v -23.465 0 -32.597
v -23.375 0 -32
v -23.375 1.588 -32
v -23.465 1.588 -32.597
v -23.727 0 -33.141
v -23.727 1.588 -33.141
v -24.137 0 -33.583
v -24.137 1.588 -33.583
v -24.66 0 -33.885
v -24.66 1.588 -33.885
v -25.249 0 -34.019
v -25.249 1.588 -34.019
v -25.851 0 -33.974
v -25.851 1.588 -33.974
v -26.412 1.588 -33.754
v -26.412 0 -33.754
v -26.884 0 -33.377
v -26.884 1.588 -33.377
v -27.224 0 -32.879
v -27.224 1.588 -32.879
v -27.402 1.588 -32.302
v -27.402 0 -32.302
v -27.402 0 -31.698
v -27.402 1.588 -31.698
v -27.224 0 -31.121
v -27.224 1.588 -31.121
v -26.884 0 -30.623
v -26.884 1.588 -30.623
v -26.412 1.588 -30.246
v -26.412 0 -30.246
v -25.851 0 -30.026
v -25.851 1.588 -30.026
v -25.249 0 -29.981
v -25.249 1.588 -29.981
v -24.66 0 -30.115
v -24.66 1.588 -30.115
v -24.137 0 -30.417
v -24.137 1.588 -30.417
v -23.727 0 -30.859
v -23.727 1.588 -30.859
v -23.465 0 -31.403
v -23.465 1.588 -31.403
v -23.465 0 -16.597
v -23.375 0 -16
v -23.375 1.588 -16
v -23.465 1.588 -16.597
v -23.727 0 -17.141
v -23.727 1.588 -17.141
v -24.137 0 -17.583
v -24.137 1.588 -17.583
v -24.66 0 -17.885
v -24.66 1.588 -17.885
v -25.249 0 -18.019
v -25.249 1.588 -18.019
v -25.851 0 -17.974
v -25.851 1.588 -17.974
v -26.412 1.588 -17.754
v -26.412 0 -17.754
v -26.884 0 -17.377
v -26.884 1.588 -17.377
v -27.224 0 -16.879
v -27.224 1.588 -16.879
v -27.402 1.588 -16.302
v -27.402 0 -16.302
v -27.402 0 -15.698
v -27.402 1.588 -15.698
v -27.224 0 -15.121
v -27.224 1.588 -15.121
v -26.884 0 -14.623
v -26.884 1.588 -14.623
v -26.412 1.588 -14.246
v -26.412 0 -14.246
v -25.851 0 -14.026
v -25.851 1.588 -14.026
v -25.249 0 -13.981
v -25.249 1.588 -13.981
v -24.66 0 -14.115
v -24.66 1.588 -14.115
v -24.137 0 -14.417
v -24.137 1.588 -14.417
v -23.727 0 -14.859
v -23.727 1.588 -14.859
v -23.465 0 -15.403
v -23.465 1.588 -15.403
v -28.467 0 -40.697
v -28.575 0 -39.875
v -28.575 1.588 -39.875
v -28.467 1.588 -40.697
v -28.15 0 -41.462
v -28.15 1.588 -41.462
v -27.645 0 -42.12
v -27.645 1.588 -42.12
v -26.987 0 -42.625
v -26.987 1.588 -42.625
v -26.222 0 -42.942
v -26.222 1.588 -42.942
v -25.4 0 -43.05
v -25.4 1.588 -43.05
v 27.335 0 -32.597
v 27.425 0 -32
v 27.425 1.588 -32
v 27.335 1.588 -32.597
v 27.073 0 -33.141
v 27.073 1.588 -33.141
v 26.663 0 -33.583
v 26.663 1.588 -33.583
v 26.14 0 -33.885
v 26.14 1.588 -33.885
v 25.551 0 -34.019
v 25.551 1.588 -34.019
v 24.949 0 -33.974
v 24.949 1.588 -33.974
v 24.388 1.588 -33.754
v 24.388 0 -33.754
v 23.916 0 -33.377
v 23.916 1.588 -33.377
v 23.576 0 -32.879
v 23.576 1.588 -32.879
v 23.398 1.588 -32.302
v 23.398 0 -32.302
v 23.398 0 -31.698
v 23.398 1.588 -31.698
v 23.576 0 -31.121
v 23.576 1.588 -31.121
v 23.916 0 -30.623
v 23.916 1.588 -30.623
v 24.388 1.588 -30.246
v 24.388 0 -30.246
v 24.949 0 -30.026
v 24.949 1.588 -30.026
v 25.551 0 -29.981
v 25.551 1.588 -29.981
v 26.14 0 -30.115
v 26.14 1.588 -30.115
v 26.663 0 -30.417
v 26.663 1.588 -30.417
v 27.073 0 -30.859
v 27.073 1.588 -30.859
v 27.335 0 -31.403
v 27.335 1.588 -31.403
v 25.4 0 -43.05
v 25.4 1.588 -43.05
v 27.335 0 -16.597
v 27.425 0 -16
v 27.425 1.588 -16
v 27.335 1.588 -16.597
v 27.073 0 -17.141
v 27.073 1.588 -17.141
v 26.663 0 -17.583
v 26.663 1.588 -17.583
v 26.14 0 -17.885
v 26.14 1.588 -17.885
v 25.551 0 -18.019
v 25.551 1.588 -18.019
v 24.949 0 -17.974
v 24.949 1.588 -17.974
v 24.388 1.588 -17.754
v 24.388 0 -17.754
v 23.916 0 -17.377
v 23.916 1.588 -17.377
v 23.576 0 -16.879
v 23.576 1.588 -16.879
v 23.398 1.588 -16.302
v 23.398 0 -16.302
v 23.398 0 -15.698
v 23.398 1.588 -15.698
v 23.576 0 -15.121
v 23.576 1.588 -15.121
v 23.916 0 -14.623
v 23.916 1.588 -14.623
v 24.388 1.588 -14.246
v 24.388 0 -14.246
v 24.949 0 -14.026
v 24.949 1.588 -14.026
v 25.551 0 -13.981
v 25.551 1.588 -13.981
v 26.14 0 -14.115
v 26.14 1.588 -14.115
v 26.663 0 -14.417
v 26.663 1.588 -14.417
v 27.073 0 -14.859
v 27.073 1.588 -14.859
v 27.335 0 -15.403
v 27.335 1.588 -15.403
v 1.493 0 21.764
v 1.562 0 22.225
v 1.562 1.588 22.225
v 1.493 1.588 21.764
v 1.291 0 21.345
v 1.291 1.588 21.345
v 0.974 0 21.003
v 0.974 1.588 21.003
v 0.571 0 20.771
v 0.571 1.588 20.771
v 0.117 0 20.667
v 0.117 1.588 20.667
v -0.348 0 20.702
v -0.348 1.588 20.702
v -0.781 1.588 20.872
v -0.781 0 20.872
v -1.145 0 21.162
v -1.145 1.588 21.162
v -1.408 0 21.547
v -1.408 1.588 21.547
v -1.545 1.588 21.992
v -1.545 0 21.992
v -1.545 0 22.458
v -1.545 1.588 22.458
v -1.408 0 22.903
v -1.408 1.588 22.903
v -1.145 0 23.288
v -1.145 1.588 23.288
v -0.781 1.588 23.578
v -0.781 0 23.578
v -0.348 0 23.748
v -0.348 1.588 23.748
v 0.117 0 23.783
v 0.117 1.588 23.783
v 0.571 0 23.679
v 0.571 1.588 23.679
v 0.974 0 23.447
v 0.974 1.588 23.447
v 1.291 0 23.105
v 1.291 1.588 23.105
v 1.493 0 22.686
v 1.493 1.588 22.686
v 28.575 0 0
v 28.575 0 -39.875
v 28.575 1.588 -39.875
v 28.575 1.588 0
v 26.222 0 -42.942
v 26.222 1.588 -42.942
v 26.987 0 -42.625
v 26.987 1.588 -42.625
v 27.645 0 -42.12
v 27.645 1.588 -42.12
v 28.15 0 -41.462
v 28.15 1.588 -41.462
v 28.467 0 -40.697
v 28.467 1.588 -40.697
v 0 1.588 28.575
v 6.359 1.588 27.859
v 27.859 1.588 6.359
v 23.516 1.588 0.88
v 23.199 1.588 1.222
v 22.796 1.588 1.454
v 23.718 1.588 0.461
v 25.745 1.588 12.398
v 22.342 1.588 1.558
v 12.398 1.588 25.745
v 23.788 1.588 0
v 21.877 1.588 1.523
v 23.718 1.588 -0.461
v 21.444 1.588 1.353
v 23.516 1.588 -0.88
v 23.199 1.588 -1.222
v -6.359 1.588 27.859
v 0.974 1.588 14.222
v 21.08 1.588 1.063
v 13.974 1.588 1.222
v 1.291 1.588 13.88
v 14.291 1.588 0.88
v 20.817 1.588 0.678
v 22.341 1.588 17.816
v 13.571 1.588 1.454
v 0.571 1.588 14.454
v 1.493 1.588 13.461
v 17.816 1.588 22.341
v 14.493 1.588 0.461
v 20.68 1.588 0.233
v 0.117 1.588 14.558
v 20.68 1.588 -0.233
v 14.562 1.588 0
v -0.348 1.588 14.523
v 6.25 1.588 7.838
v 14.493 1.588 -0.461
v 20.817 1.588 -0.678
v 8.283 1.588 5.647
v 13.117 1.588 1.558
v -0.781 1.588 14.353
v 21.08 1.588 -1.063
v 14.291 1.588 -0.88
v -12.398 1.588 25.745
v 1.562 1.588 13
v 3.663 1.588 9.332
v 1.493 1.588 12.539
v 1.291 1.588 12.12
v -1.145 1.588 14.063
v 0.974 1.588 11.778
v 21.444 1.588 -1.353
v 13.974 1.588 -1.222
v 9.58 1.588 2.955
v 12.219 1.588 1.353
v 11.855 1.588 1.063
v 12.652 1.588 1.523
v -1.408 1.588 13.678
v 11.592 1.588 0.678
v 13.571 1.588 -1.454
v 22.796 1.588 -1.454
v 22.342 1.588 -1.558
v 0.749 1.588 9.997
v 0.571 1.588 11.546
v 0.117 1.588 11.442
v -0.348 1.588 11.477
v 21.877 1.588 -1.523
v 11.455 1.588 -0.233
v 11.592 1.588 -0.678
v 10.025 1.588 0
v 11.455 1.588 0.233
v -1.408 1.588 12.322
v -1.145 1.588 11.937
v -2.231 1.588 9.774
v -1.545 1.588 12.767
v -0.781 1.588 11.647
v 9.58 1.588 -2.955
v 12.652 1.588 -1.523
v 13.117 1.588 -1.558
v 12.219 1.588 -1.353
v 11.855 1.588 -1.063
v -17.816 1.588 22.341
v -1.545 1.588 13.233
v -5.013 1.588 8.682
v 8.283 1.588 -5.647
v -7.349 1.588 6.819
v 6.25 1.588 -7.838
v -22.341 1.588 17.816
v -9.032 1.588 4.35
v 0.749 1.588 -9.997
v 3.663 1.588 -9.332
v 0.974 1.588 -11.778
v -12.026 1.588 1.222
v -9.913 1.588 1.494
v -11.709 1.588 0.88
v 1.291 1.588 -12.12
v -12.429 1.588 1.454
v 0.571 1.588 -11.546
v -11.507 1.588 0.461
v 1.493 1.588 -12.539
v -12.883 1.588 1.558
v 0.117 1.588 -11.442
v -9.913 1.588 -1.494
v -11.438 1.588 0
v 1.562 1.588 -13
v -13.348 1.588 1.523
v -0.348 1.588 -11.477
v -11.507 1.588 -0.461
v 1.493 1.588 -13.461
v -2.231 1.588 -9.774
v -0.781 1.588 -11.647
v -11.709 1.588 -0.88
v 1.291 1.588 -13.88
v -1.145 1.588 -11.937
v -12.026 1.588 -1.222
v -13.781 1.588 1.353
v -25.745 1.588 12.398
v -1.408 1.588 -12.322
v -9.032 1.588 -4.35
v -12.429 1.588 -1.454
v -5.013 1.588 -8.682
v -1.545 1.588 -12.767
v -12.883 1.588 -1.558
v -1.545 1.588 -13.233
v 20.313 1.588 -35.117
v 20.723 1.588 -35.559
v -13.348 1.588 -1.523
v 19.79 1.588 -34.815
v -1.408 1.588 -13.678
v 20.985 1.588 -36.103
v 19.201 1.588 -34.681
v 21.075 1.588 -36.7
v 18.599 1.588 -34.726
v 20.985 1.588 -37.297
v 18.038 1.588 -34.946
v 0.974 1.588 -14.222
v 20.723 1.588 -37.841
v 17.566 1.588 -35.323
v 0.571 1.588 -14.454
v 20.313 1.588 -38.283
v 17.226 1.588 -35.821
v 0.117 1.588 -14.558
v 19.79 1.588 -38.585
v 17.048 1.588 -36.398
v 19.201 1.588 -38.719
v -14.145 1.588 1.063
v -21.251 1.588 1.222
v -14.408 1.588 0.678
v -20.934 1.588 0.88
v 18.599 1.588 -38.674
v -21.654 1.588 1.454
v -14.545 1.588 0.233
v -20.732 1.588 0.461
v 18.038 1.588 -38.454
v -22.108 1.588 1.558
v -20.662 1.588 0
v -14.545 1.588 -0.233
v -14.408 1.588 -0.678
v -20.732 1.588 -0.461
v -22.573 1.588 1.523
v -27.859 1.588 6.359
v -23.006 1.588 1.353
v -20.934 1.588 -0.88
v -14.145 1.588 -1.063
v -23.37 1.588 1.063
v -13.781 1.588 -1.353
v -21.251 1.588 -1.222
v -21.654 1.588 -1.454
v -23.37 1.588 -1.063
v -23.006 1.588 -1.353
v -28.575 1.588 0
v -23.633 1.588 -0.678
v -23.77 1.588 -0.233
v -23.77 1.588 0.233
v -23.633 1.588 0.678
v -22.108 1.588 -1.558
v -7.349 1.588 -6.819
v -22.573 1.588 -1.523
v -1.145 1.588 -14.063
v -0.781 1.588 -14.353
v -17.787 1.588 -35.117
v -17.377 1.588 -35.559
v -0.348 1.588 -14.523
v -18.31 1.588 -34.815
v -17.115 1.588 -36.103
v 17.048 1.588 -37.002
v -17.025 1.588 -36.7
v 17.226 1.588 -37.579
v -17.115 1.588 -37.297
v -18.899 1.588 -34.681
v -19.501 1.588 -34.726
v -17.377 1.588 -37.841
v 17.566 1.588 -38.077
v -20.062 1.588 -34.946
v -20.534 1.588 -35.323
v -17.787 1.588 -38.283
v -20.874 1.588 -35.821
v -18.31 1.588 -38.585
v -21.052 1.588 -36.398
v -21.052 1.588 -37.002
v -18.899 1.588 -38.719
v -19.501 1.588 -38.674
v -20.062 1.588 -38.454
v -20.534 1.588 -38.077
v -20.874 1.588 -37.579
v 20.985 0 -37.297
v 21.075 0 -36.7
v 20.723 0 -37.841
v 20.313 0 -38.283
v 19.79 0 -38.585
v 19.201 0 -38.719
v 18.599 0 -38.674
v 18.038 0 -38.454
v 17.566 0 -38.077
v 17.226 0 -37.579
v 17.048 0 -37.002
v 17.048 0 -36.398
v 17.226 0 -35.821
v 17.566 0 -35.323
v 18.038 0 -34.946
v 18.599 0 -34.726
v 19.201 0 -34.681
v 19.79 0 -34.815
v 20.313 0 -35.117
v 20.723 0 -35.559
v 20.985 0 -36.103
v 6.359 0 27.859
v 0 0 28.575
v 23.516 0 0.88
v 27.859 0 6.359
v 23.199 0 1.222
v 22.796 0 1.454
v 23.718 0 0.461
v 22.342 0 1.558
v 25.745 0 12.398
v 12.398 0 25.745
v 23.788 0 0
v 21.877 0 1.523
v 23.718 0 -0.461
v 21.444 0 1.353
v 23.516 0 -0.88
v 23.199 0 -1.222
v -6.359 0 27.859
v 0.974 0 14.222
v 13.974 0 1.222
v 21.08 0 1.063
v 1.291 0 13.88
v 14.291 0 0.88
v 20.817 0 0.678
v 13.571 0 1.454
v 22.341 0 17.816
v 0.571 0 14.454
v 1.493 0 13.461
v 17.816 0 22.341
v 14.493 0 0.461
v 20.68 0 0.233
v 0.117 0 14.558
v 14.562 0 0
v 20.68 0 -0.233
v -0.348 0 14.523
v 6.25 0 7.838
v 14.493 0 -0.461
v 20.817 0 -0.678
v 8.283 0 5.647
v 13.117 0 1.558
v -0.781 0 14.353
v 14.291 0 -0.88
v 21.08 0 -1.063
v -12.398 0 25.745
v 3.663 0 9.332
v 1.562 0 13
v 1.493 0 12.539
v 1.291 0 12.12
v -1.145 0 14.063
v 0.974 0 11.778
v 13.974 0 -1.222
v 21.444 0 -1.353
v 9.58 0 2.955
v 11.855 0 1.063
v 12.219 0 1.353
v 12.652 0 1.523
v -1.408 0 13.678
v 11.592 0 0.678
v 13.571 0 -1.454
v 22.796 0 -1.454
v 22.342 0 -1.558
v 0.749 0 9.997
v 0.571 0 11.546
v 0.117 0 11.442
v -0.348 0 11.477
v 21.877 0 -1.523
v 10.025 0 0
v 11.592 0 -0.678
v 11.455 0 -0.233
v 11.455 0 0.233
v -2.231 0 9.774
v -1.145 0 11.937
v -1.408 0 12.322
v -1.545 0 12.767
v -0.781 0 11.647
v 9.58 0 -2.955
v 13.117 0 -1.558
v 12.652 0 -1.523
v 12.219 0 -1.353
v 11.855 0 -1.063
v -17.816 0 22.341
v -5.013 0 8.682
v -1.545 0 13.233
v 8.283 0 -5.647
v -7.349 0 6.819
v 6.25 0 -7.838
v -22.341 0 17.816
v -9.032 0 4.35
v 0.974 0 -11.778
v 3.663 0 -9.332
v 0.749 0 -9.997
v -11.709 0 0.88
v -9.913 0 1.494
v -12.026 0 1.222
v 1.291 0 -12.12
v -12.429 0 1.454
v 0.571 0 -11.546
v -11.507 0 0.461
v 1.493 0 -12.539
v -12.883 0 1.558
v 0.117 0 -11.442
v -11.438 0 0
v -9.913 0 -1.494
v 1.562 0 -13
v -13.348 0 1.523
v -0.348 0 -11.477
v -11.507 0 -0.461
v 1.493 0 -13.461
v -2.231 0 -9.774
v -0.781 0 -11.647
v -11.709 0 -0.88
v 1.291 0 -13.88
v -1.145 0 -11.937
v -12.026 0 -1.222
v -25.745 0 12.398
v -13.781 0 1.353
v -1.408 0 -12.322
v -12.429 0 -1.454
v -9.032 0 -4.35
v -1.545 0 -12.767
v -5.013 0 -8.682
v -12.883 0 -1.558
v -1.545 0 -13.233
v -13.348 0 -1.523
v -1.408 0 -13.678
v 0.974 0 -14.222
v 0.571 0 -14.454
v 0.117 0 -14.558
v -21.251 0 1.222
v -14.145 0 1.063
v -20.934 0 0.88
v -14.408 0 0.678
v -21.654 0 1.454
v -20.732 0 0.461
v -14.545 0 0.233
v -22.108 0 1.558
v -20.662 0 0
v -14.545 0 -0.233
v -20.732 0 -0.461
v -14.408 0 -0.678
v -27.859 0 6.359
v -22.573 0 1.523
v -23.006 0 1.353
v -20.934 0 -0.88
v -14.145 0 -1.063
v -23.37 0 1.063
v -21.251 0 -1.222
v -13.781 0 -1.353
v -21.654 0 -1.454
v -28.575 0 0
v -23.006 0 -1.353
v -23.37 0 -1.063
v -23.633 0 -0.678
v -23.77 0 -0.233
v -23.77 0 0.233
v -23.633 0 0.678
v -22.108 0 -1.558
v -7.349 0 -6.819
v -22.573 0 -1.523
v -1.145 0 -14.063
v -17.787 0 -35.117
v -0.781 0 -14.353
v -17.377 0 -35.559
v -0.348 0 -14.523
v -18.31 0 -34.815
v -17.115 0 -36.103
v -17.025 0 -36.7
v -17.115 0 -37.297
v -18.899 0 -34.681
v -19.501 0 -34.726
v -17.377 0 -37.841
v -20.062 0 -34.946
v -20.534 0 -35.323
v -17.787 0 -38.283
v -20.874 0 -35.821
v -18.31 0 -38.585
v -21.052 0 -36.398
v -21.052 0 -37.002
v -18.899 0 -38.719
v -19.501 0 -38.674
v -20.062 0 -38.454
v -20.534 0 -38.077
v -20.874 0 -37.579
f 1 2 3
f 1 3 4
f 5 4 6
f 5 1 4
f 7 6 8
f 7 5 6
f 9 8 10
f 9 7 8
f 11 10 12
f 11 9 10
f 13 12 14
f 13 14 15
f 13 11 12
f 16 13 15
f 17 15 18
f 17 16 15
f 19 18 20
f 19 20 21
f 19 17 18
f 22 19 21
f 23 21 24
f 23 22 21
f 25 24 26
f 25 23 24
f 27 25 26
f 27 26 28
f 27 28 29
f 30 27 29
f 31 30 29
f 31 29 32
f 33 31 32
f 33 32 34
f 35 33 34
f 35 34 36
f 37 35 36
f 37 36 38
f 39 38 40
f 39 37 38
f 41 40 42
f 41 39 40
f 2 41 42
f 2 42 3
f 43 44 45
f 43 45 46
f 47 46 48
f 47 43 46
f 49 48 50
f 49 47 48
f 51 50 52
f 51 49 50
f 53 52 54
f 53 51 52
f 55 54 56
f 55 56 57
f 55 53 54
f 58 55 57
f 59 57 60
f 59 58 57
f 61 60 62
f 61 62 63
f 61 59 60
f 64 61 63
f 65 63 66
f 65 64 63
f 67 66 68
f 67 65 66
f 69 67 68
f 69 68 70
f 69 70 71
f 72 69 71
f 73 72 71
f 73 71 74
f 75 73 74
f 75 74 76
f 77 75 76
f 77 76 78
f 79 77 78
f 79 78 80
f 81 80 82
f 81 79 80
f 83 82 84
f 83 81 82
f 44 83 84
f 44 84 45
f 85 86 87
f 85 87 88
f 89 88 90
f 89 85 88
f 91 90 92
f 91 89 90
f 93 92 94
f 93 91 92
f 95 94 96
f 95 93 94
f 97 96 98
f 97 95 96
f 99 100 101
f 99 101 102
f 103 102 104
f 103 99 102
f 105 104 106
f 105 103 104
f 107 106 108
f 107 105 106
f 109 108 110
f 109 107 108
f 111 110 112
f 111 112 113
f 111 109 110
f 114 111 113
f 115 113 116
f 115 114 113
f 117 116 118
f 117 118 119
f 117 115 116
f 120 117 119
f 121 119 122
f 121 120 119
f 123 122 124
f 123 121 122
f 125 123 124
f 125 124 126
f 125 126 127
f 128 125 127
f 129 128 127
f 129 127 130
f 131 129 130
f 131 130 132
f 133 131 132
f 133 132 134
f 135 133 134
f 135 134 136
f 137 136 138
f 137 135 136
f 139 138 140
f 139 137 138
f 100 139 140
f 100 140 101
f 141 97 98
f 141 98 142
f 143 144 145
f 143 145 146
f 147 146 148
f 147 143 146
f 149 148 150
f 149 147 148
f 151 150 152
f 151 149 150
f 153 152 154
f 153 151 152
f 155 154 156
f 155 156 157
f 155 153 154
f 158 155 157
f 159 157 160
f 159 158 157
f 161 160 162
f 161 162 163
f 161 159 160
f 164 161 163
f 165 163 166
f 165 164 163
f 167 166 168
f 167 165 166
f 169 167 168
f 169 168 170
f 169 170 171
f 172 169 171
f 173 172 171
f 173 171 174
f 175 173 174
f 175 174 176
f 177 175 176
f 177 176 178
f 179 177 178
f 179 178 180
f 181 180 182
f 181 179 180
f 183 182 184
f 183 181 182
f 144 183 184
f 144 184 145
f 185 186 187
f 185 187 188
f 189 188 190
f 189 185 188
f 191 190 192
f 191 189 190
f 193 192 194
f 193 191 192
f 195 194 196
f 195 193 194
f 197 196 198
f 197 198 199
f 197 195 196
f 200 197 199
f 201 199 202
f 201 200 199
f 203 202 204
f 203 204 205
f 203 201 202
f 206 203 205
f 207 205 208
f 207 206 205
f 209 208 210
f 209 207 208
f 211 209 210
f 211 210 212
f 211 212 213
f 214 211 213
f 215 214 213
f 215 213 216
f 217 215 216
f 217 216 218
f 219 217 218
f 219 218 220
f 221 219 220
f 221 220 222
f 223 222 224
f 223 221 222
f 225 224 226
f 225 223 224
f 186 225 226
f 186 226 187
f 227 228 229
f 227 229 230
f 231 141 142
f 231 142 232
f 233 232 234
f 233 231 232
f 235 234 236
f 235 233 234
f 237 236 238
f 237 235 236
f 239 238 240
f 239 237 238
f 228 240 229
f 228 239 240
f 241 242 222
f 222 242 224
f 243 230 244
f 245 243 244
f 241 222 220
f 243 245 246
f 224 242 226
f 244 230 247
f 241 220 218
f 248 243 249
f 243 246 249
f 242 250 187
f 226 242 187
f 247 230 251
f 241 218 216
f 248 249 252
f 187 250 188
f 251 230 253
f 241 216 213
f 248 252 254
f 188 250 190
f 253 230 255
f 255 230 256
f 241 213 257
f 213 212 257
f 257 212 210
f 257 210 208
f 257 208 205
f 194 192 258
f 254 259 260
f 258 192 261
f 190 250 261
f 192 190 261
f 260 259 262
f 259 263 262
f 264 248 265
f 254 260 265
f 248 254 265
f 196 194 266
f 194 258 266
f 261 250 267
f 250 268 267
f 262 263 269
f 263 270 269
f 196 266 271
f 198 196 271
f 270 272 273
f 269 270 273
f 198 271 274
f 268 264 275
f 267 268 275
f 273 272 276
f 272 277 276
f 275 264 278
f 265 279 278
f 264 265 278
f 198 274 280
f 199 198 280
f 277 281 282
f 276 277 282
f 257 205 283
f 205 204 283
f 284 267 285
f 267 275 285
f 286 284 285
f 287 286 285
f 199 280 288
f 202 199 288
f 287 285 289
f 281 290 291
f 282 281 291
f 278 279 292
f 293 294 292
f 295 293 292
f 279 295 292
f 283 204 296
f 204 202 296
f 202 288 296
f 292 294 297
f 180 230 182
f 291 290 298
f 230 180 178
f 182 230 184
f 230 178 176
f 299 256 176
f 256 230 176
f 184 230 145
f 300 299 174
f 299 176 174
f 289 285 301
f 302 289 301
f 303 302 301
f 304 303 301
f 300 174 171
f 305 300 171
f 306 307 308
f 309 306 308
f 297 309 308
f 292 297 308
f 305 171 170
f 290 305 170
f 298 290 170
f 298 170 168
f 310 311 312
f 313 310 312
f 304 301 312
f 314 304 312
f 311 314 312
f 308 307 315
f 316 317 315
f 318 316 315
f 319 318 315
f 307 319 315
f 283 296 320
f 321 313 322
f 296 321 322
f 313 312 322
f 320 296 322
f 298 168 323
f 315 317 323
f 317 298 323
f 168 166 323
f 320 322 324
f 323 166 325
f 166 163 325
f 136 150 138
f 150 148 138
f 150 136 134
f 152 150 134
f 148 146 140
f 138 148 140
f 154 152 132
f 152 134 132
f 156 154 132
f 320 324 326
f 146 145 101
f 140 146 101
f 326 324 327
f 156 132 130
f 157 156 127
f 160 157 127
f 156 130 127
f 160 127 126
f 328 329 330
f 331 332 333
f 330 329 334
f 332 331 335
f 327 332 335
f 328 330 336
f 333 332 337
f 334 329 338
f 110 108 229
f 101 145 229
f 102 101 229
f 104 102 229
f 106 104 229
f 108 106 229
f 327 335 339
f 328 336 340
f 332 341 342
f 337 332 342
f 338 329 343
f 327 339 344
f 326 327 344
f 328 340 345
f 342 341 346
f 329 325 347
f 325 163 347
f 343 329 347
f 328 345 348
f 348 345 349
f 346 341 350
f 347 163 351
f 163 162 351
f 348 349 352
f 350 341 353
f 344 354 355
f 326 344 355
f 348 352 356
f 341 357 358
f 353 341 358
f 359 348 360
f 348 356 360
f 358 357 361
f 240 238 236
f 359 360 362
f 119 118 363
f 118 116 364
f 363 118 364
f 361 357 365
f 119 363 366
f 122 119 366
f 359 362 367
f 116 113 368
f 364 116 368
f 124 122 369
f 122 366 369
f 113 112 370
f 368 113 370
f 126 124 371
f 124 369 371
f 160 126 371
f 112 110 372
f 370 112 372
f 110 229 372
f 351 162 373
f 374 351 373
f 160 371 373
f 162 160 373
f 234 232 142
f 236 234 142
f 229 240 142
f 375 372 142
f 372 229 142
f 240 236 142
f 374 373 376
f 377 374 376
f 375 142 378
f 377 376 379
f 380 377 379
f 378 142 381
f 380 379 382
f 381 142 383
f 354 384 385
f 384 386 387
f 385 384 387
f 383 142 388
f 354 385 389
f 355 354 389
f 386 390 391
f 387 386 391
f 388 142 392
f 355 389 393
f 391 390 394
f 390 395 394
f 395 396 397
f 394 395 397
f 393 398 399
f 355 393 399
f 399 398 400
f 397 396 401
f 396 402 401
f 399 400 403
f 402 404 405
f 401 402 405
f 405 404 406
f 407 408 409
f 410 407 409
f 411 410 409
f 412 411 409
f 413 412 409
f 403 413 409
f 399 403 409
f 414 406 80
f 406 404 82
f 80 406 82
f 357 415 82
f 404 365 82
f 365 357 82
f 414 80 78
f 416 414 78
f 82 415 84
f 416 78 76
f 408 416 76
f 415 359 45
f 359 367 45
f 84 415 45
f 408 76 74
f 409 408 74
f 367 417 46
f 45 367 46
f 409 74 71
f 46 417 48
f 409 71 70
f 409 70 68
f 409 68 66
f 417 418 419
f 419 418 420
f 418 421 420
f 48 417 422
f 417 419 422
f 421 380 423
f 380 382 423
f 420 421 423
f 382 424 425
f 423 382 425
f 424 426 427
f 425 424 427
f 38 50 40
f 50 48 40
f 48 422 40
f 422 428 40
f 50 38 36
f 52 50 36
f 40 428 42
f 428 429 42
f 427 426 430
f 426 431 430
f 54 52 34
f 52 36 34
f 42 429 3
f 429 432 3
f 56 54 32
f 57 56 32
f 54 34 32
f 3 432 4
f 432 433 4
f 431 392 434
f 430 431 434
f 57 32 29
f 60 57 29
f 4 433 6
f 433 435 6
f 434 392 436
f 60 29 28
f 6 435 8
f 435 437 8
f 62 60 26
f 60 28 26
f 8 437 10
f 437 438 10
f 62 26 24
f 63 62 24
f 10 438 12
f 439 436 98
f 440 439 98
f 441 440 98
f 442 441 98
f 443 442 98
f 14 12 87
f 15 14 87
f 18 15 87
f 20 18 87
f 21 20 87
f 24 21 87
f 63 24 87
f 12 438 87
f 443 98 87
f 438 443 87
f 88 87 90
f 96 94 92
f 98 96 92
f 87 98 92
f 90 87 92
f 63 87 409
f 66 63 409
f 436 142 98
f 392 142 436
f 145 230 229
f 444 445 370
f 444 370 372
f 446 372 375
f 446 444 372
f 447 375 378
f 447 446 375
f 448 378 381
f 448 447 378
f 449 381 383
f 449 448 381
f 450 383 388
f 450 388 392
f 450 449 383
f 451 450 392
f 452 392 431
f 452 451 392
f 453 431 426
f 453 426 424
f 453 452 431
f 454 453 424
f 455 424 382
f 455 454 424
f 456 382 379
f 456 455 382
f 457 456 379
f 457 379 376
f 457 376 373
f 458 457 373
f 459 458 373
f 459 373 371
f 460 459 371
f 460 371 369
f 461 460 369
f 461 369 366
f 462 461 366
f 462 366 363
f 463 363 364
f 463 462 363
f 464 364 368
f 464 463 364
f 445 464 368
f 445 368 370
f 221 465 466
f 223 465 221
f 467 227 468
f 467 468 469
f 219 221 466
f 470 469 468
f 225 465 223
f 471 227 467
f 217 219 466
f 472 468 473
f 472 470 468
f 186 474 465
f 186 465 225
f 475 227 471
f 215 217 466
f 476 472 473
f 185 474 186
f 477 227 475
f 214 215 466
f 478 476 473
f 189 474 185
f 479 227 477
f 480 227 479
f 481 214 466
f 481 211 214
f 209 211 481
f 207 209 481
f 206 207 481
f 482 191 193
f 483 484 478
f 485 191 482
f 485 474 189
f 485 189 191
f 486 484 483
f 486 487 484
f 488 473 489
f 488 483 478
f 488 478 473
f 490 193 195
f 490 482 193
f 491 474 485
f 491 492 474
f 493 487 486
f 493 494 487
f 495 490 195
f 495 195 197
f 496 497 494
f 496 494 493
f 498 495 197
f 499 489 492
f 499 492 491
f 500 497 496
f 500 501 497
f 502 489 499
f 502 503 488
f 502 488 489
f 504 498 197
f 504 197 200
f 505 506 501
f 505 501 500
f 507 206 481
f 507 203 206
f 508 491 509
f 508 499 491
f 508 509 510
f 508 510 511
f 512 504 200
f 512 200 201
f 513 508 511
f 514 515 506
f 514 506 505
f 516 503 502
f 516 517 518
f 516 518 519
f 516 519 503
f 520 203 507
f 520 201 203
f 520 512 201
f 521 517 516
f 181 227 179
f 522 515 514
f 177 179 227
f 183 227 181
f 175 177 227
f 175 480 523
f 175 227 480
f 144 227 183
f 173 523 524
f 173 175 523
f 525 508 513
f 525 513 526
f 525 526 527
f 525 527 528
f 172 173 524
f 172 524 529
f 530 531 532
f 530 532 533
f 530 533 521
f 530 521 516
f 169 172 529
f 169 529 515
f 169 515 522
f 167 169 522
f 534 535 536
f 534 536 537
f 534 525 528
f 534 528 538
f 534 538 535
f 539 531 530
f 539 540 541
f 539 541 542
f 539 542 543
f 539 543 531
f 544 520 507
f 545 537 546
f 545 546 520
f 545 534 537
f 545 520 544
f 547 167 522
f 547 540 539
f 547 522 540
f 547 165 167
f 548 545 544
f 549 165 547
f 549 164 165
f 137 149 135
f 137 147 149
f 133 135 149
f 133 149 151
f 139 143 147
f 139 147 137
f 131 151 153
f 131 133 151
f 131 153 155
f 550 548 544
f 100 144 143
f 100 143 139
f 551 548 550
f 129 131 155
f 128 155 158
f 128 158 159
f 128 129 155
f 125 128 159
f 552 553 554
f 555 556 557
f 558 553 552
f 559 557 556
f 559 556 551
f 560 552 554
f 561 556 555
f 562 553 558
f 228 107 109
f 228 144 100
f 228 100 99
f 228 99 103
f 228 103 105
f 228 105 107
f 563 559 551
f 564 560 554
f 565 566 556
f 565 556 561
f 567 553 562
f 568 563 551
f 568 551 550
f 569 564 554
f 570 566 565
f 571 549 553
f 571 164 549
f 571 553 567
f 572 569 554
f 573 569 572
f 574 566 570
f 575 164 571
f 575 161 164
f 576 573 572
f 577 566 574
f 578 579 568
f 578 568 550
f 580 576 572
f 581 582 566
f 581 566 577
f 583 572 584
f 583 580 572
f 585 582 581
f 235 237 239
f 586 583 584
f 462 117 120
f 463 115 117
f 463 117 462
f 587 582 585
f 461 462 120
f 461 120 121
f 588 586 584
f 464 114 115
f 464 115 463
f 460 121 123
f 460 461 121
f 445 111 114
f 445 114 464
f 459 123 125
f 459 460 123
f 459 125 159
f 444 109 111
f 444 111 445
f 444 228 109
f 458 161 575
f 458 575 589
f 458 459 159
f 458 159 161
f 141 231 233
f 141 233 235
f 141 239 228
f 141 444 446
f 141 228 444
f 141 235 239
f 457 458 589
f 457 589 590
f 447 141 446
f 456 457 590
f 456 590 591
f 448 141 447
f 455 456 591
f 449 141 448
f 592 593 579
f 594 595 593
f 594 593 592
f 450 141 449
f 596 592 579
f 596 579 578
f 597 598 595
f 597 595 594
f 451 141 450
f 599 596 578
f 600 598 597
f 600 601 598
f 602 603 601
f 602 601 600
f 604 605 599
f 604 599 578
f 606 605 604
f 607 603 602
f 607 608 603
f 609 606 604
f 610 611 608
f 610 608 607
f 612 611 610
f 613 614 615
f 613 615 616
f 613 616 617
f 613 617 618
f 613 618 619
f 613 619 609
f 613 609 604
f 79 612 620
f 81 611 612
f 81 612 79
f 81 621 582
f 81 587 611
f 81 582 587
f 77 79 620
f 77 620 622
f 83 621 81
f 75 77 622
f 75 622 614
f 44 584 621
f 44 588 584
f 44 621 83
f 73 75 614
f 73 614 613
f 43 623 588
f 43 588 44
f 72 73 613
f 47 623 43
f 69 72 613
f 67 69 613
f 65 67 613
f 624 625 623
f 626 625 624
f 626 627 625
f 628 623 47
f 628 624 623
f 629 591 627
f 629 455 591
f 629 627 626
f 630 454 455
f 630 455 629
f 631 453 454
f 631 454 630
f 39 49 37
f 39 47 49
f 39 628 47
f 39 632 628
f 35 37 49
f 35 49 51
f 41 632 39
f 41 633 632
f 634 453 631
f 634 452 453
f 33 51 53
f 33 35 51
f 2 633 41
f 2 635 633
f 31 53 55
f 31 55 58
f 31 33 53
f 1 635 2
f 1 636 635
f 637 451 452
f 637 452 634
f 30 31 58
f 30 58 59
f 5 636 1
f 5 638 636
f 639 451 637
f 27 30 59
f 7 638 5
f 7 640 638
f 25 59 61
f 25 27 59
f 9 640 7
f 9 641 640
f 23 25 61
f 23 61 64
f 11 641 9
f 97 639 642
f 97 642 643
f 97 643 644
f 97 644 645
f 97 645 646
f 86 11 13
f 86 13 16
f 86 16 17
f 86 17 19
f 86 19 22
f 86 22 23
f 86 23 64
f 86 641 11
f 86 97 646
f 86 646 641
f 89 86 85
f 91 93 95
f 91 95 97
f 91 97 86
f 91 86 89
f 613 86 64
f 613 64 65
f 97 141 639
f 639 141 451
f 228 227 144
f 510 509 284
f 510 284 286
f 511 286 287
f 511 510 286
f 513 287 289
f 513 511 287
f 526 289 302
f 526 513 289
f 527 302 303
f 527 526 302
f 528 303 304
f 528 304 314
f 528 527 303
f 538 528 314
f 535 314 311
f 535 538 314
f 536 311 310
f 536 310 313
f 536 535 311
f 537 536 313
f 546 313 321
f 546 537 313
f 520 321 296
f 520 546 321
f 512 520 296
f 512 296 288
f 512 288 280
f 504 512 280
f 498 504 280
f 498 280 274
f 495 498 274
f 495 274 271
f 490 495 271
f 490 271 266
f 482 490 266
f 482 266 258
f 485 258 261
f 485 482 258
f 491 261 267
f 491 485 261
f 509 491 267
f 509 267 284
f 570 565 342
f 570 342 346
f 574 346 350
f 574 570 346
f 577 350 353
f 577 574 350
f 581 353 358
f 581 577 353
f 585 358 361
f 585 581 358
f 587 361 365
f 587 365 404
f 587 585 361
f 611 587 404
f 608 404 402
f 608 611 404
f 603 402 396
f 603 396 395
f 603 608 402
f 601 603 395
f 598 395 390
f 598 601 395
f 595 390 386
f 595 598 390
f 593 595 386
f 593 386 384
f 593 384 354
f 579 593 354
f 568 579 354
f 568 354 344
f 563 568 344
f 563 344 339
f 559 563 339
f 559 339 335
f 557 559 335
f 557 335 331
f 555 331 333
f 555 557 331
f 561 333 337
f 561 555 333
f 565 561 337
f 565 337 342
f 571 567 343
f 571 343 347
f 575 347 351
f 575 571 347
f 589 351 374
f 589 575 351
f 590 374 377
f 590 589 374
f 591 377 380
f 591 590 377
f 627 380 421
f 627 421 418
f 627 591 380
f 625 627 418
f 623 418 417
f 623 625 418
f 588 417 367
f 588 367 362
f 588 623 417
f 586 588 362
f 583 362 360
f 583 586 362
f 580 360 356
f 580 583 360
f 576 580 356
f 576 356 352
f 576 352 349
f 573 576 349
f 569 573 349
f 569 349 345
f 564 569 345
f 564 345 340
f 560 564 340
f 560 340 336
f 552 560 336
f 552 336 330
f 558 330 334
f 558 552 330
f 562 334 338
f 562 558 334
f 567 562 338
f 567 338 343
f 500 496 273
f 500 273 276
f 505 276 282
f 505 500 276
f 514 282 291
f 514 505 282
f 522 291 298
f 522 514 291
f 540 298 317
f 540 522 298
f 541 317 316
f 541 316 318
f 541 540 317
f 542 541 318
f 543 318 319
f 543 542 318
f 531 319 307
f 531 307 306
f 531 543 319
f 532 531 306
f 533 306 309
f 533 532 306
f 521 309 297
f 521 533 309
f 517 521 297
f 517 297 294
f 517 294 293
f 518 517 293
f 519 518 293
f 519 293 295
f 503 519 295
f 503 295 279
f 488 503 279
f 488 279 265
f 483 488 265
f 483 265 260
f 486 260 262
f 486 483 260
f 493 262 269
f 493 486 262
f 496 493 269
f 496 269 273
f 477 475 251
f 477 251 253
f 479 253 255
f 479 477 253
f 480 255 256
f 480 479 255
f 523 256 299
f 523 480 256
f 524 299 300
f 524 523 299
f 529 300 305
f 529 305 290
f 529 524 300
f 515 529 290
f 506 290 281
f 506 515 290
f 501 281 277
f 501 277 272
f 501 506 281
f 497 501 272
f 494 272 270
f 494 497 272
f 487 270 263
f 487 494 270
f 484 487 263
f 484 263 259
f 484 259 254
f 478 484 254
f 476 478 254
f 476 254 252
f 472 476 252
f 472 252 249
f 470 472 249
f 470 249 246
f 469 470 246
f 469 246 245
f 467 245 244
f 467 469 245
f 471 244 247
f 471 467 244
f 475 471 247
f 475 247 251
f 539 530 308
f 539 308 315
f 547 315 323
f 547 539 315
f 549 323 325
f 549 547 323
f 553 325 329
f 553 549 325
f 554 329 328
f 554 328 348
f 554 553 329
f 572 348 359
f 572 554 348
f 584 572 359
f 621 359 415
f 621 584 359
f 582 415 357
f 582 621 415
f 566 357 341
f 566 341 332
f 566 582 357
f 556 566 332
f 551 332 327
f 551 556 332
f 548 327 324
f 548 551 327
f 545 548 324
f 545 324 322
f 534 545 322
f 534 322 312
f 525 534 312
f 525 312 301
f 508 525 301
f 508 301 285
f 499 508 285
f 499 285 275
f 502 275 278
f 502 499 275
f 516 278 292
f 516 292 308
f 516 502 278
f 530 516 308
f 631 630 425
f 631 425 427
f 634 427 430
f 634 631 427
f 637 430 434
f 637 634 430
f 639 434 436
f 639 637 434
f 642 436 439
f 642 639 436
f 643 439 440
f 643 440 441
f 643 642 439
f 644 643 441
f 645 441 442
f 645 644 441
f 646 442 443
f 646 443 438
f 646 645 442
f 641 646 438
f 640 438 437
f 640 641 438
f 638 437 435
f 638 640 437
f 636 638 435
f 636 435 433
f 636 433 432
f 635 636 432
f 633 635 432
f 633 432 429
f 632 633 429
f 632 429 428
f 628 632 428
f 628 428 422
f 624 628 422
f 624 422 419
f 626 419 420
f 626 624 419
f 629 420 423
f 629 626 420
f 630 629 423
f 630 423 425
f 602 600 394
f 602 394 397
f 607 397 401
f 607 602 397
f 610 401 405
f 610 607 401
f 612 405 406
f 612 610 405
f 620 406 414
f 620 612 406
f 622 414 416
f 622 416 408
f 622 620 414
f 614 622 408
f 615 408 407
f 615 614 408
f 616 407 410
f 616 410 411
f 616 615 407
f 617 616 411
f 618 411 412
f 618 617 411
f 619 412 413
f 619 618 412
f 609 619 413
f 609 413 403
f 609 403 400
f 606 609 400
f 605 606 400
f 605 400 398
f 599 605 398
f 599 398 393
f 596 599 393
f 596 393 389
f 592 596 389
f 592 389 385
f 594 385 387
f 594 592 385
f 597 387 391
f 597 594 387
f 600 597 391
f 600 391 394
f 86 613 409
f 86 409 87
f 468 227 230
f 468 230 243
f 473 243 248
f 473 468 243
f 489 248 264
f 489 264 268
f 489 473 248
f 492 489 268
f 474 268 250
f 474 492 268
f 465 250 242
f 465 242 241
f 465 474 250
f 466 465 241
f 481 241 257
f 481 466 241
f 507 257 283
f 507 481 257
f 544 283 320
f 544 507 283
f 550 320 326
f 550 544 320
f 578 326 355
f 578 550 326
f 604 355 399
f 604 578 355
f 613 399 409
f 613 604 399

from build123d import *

# Parameters (mm, degrees)
SKETCH1_R           = 10.025
SKETCH1_R_2         = 1.5625
SKETCH1_R_3         = 2.025
BOSS_EXTRUDE1_DEPTH = 1.5875


with BuildPart() as part:
    # Sketch1 → Boss-Extrude1 (new body)
    with BuildSketch(Plane(origin=(0, 0, 0), x_dir=(1, 0, 0), z_dir=(0, 1, 0))):
        with BuildLine():
            Line((-28.575, 0), (-28.575, 39.875))
            ThreePointArc((-28.575, 39.875), (-27.64506403, 42.12006403), (-25.4, 43.05))
            Line((-25.4, 43.05), (25.4, 43.05))
            ThreePointArc((25.4, 43.05), (27.64506403, 42.12006403), (28.575, 39.875))
            Line((28.575, 39.875), (28.575, 0))
            ThreePointArc((28.575, 0), (0, -28.575), (-28.575, 0))
        make_face()
        Circle(SKETCH1_R, mode=Mode.SUBTRACT)
        with Locations((0, -13)):
            Circle(SKETCH1_R_2, mode=Mode.SUBTRACT)
        with Locations((-13, 0)):
            Circle(SKETCH1_R_2, mode=Mode.SUBTRACT)
        with Locations((0, 13)):
            Circle(SKETCH1_R_2, mode=Mode.SUBTRACT)
        with Locations((13, 0)):
            Circle(SKETCH1_R_2, mode=Mode.SUBTRACT)
        with Locations((-22.225, 0)):
            Circle(SKETCH1_R_2, mode=Mode.SUBTRACT)
        with Locations((0, -22.225)):
            Circle(SKETCH1_R_2, mode=Mode.SUBTRACT)
        with Locations((22.225, 0)):
            Circle(SKETCH1_R_2, mode=Mode.SUBTRACT)
        with Locations((-25.4, 16)):
            Circle(SKETCH1_R_3, mode=Mode.SUBTRACT)
        with Locations((25.4, 16)):
            Circle(SKETCH1_R_3, mode=Mode.SUBTRACT)
        with Locations((25.4, 32)):
            Circle(SKETCH1_R_3, mode=Mode.SUBTRACT)
        with Locations((-25.4, 32)):
            Circle(SKETCH1_R_3, mode=Mode.SUBTRACT)
        with Locations((-19.05, 36.7)):
            Circle(SKETCH1_R_3, mode=Mode.SUBTRACT)
        with Locations((19.05, 36.7)):
            Circle(SKETCH1_R_3, mode=Mode.SUBTRACT)
    extrude(amount=BOSS_EXTRUDE1_DEPTH)


solid = part.part
